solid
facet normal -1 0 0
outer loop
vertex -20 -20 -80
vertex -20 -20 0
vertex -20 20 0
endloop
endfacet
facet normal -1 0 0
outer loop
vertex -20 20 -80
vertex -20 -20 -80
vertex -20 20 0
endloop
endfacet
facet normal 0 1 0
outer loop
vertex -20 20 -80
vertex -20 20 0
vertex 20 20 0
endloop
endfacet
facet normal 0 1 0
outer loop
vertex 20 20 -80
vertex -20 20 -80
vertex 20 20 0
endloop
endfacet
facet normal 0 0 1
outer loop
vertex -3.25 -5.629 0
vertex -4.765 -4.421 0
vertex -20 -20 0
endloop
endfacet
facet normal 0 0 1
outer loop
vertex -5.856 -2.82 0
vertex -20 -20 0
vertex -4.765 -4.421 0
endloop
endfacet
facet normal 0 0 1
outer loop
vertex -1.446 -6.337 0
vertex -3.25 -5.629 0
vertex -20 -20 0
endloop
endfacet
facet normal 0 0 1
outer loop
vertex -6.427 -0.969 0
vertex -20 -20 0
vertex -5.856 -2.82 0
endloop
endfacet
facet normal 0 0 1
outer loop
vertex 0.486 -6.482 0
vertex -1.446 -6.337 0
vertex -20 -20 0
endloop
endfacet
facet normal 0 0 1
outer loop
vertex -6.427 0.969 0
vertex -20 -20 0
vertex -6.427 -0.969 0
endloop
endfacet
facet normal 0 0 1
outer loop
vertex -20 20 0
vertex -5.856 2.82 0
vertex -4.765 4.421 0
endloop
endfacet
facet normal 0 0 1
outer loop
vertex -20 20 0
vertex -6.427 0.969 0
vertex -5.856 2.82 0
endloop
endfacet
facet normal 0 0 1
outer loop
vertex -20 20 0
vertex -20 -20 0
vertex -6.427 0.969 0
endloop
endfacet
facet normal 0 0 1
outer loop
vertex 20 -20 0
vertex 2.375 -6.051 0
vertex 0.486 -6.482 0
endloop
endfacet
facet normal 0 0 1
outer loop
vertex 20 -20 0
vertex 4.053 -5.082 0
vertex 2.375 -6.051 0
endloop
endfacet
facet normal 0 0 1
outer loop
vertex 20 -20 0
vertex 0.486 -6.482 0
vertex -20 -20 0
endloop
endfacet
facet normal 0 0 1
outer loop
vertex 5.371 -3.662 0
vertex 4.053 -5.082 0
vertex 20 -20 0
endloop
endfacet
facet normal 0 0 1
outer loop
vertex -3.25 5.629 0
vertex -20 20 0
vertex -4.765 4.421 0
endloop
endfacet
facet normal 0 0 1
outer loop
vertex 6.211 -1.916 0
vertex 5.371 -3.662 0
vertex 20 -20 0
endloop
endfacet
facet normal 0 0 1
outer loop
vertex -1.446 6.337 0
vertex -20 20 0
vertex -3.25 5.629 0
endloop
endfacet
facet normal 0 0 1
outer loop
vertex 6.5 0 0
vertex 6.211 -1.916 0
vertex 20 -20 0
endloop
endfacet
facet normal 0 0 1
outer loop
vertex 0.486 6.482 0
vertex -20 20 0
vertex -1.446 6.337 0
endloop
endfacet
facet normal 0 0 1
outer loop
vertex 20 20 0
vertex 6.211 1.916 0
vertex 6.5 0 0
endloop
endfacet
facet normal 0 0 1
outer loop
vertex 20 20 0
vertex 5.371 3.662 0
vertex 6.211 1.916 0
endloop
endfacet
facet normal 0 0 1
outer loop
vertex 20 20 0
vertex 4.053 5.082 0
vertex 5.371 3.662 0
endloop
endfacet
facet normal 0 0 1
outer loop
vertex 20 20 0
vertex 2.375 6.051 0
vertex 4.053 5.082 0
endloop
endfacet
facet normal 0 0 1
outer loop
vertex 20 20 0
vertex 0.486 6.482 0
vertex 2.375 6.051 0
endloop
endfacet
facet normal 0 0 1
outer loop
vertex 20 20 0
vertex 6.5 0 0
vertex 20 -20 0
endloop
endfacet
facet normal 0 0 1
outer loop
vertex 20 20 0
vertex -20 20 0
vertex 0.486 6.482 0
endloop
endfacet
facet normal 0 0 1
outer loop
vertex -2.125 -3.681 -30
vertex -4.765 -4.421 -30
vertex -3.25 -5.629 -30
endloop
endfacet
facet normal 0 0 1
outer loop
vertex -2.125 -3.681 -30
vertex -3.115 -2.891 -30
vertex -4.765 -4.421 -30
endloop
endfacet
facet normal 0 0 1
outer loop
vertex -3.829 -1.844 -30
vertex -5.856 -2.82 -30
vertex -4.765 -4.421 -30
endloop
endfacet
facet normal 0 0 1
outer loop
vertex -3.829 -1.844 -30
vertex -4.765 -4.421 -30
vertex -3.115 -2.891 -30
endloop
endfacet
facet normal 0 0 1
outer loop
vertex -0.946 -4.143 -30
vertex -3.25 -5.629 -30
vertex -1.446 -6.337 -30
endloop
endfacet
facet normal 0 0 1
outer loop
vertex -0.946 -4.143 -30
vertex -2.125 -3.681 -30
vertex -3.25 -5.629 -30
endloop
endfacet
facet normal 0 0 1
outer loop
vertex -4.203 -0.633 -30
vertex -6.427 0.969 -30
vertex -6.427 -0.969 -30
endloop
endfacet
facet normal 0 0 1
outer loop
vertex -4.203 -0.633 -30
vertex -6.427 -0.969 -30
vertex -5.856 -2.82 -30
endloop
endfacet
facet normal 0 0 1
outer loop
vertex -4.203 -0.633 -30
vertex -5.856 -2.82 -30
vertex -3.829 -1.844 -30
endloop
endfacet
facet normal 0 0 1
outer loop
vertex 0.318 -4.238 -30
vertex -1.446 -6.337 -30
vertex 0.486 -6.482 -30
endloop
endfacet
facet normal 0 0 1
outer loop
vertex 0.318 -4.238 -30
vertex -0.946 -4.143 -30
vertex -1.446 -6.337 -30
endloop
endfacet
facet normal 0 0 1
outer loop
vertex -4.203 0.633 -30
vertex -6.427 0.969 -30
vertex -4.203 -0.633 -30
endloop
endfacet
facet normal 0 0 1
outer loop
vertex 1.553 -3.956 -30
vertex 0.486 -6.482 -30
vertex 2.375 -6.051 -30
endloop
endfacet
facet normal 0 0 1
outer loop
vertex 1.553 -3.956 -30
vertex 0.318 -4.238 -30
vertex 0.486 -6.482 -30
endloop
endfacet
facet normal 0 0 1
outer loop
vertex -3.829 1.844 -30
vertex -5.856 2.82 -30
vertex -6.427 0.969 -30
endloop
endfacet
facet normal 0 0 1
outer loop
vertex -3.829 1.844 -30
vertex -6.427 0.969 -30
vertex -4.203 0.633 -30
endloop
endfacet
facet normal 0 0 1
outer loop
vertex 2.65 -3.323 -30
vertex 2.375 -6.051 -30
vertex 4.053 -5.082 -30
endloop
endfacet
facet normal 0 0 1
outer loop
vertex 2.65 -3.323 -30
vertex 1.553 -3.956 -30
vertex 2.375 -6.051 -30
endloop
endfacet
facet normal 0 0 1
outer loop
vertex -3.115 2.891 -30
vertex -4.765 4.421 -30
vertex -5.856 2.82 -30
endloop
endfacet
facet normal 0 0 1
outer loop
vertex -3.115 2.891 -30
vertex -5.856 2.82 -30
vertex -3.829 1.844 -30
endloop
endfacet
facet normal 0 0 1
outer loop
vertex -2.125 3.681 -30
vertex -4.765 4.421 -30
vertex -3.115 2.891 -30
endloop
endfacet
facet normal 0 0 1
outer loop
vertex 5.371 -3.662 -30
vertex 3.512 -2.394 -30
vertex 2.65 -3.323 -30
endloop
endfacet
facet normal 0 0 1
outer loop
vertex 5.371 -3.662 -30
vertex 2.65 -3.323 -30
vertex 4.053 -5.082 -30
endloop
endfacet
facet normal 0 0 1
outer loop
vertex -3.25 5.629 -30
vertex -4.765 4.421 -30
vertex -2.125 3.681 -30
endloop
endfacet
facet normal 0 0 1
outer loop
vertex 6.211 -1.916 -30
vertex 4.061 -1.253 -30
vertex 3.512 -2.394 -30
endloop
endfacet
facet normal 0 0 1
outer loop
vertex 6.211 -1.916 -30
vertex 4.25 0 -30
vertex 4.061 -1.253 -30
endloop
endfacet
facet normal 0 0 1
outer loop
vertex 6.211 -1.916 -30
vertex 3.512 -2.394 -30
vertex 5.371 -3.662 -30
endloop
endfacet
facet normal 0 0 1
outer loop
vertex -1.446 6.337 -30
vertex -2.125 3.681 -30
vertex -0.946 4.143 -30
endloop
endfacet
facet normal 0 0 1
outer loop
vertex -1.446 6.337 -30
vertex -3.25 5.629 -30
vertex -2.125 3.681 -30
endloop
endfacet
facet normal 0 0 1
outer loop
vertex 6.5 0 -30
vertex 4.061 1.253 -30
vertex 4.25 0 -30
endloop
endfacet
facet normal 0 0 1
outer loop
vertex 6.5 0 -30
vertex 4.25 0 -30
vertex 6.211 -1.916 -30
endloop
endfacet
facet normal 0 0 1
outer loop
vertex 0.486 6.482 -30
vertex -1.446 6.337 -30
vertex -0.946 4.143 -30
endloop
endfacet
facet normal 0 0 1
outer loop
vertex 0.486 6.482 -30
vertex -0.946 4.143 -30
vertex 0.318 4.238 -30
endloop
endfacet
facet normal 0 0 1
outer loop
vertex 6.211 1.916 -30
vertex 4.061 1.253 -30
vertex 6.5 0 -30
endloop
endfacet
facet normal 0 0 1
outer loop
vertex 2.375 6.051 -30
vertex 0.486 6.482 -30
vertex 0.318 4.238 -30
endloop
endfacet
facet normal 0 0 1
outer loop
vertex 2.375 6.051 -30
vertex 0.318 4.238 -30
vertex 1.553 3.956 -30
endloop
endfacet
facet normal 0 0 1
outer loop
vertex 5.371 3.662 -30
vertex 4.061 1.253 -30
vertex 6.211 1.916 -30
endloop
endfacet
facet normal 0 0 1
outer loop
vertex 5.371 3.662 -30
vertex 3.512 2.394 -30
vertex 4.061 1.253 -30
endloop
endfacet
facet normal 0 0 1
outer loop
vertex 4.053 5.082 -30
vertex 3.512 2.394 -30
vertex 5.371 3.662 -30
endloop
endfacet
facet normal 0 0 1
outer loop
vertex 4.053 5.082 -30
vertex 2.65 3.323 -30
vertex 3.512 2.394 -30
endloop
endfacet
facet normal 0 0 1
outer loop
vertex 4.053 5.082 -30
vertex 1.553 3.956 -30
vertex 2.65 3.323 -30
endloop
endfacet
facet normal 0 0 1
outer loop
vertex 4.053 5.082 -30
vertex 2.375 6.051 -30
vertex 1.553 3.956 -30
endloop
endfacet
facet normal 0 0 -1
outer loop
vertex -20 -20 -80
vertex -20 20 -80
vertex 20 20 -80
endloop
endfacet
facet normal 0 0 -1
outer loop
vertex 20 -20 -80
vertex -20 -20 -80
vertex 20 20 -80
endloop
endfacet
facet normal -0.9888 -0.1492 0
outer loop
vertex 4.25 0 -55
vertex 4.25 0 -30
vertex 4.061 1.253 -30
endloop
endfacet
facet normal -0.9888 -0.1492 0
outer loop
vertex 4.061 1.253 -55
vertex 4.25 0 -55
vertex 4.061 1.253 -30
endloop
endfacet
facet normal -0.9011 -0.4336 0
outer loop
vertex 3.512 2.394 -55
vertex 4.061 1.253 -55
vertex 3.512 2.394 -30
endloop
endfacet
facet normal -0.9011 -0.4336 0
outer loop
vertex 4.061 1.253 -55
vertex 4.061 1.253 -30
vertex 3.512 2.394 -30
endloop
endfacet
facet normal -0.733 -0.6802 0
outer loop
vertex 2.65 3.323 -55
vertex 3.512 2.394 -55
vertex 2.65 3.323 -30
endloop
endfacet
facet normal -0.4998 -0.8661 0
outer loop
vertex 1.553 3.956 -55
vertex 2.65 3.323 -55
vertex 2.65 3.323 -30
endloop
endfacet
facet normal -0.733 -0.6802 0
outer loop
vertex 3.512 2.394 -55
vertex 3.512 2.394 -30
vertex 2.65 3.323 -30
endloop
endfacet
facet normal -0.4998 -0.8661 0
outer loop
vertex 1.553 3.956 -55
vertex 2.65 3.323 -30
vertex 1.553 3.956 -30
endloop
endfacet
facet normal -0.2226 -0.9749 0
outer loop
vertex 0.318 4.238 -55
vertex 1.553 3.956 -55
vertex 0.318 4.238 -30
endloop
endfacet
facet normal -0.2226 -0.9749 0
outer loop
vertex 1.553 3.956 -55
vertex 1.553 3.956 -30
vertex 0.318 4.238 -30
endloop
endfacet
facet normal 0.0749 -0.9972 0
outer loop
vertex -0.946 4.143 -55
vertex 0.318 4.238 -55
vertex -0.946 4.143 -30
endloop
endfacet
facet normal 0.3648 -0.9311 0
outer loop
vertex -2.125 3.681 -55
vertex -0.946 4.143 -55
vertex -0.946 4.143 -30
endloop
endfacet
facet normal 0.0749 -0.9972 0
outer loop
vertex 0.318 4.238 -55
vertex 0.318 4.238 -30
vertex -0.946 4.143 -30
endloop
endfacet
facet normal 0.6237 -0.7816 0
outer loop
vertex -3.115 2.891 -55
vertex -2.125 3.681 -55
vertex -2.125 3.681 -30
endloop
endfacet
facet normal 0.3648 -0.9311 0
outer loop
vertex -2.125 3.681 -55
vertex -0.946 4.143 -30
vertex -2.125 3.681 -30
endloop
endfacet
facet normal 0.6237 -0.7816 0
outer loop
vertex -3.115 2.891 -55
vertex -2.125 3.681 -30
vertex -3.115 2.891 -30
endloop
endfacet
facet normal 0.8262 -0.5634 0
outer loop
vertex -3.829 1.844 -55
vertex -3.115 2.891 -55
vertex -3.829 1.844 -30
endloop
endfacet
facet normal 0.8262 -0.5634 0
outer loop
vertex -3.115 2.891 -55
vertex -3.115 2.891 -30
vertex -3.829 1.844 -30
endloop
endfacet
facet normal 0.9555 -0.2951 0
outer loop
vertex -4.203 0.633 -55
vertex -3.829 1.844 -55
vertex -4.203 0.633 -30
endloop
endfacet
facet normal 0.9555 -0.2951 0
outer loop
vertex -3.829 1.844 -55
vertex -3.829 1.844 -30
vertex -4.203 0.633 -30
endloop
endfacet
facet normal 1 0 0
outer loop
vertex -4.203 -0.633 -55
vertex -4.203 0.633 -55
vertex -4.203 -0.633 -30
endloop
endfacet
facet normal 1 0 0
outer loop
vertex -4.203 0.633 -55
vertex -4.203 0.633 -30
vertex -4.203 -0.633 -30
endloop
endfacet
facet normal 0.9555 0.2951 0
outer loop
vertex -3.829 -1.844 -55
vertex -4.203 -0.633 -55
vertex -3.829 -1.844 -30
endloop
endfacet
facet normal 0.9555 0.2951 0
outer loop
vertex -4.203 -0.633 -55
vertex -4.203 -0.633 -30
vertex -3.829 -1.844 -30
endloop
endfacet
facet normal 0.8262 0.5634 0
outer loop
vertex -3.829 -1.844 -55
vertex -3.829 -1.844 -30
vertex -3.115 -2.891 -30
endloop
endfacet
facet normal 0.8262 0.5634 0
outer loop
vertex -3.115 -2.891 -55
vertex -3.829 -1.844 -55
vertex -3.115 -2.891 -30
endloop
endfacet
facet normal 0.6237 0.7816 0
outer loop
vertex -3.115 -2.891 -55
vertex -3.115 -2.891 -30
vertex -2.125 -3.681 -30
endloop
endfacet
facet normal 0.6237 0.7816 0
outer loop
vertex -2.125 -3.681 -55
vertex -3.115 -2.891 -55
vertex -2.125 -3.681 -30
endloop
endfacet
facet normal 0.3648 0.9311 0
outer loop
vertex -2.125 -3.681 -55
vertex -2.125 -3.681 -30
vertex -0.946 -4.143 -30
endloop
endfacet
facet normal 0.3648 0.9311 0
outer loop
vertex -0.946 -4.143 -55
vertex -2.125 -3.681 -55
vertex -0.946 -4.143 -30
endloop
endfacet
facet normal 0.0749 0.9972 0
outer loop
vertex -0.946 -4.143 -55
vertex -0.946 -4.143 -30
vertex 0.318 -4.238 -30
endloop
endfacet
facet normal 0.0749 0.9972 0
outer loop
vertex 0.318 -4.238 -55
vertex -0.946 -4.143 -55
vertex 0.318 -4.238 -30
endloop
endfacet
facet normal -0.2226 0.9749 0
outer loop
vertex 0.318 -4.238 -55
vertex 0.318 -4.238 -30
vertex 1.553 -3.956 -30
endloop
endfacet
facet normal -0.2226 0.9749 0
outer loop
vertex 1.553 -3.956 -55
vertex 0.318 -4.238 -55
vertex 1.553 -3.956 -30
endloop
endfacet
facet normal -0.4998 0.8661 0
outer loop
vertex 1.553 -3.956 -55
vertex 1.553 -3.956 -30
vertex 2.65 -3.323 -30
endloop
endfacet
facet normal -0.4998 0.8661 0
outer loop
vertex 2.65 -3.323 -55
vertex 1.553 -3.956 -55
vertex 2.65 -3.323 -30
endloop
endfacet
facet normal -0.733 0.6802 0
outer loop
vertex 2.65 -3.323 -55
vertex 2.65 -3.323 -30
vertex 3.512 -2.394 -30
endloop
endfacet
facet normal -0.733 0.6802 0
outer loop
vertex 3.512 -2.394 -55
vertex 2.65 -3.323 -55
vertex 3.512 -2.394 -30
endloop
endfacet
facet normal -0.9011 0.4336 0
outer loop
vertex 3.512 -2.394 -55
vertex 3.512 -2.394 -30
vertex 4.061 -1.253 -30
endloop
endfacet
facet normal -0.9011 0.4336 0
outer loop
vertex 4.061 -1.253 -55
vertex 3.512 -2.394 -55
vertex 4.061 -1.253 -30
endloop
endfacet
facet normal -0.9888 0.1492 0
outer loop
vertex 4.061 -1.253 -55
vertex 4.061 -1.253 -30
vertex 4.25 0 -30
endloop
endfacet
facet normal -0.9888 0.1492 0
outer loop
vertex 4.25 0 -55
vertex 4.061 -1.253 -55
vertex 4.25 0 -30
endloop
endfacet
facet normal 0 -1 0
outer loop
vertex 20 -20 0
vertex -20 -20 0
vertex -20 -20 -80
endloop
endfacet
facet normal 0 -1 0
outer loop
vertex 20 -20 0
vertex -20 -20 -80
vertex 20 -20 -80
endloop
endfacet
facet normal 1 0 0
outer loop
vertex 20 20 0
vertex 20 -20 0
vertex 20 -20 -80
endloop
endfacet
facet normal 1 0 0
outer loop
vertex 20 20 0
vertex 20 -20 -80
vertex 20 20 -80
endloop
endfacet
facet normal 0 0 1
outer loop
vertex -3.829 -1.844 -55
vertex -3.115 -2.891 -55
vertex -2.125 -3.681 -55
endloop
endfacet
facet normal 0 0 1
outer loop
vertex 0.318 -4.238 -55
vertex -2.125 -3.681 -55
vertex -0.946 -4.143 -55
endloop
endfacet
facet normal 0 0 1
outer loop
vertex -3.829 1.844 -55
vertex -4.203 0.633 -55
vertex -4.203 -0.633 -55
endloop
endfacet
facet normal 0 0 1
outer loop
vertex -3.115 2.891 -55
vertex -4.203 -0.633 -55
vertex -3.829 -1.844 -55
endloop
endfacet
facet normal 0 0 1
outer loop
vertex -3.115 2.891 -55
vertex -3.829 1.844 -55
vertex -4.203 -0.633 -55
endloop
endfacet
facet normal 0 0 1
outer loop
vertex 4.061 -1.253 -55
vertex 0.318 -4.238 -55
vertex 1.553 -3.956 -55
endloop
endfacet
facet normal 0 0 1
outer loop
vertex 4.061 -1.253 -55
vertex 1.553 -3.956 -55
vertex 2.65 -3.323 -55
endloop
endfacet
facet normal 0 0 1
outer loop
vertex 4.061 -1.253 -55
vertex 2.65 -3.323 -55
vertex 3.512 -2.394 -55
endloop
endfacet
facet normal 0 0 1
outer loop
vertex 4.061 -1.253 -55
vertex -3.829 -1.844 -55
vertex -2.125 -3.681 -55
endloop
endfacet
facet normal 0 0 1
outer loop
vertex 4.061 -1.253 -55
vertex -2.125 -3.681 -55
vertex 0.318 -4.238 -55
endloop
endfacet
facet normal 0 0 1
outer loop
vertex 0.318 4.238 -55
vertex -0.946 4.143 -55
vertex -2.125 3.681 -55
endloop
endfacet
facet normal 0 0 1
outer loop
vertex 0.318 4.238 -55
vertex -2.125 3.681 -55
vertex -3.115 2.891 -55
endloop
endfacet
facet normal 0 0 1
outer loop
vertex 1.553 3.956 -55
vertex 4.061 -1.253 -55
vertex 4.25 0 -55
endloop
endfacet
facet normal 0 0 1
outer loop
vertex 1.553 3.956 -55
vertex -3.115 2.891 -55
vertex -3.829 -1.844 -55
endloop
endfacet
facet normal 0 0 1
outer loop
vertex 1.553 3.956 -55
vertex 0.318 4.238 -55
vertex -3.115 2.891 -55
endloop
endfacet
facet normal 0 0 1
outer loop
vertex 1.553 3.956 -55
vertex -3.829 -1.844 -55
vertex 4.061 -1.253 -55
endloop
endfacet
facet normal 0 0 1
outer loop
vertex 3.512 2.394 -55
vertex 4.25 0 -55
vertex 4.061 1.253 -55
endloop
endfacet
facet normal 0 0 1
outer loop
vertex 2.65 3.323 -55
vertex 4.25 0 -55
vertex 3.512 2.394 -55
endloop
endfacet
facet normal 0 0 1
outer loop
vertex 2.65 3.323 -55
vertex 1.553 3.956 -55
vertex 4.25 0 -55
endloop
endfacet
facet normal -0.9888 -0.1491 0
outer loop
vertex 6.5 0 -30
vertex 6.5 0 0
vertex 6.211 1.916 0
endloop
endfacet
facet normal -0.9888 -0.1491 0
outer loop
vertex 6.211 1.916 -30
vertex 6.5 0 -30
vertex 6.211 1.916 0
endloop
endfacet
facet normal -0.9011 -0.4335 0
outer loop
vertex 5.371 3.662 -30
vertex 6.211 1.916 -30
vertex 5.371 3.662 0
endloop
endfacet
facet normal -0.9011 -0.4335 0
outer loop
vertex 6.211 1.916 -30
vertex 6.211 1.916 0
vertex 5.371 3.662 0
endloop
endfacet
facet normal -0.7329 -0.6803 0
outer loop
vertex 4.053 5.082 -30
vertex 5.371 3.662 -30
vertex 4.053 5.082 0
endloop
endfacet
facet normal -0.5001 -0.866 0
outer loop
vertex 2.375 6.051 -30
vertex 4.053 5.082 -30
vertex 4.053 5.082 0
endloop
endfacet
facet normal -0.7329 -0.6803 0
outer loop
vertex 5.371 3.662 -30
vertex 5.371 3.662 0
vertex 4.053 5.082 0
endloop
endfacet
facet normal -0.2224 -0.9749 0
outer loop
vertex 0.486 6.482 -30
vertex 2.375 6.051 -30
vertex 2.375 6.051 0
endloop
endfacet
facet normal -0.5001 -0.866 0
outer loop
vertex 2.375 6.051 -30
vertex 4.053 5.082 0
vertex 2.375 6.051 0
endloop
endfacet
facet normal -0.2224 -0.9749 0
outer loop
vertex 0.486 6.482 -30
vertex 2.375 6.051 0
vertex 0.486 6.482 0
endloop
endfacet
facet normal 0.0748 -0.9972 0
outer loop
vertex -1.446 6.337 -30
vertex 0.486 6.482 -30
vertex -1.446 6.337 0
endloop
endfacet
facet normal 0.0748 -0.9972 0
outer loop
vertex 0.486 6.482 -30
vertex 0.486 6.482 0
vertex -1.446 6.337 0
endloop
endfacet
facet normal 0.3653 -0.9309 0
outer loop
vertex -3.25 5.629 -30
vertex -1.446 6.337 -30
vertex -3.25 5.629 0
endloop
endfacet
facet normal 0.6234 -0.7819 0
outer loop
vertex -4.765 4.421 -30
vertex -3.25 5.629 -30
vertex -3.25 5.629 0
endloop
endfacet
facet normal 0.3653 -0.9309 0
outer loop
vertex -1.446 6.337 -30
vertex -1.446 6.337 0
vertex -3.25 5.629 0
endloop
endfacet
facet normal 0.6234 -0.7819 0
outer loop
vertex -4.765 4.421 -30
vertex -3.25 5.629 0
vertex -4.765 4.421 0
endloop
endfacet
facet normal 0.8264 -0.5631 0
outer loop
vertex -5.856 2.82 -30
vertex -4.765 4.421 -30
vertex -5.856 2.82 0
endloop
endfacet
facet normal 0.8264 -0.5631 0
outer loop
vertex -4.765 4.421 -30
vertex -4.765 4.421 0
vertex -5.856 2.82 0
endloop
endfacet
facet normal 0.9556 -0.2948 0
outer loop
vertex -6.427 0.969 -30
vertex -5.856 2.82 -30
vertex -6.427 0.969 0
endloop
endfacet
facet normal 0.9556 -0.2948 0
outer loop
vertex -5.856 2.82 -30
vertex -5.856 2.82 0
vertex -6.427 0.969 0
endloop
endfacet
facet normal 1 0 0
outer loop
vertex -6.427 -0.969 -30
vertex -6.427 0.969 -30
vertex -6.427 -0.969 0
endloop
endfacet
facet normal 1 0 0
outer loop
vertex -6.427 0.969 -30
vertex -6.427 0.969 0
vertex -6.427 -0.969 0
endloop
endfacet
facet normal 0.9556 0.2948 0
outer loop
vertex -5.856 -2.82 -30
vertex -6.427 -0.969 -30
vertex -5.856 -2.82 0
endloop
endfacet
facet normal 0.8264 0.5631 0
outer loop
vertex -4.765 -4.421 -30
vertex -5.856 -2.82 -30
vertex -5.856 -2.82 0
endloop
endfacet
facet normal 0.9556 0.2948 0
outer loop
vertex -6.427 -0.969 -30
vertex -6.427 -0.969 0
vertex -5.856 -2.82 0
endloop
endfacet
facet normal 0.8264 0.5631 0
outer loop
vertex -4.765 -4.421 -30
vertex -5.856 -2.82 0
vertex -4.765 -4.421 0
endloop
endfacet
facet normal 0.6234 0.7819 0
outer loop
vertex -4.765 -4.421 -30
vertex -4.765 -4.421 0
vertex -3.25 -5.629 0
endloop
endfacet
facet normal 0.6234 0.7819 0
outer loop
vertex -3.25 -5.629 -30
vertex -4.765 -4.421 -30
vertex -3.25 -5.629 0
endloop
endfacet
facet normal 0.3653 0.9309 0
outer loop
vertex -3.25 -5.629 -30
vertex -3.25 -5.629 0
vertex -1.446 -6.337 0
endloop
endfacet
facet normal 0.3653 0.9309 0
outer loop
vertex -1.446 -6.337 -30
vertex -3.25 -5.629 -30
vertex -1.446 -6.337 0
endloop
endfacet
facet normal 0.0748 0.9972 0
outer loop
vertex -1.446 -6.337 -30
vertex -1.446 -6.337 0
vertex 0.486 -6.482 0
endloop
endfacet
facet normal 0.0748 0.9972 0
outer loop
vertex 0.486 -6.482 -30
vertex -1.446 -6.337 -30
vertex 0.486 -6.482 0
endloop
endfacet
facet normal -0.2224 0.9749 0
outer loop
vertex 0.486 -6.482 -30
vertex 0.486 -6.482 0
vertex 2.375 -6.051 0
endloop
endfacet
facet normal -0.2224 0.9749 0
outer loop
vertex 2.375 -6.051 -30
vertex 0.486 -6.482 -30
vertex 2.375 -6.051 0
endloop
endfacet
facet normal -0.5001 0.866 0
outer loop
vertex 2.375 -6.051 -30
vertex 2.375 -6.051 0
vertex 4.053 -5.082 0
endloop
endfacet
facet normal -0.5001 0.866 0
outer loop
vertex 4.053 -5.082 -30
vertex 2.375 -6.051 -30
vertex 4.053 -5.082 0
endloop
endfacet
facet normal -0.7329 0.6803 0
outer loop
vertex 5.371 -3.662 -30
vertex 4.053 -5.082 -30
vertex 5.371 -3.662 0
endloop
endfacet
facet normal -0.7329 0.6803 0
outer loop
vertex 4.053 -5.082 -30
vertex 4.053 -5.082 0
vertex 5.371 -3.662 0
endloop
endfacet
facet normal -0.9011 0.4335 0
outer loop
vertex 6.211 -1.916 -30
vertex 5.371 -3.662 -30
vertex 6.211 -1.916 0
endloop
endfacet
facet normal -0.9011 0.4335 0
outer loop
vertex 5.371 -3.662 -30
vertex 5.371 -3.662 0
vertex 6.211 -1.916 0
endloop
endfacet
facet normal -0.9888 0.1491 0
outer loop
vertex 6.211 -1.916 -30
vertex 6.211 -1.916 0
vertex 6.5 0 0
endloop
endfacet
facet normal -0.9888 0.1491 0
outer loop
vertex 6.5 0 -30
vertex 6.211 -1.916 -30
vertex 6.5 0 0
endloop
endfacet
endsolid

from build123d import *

# Parameters (mm, degrees)
SKETCH_W        = 40
SKETCH_H        = 40
PAD_DEPTH       = 80
SKETCH001_R     = 6.5
POCKET_DEPTH    = 30
SKETCH002_R     = 4.25
POCKET001_DEPTH = 55


with BuildPart() as part:
    # Sketch → Pad (new body)
    with BuildSketch(Plane.XY):
        Rectangle(SKETCH_W, SKETCH_H)
    extrude(amount=-PAD_DEPTH)

    # Sketch001 (on Face5 of Pad) → Pocket (cut)
    with BuildSketch(Plane.XY):
        Circle(SKETCH001_R)
    extrude(amount=-POCKET_DEPTH, mode=Mode.SUBTRACT)

    # Sketch002 (on Face4 of Pocket) → Pocket001 (cut)
    with BuildSketch(Plane.XY):
        Circle(SKETCH002_R)
    extrude(amount=-POCKET001_DEPTH, mode=Mode.SUBTRACT)


solid = part.part
